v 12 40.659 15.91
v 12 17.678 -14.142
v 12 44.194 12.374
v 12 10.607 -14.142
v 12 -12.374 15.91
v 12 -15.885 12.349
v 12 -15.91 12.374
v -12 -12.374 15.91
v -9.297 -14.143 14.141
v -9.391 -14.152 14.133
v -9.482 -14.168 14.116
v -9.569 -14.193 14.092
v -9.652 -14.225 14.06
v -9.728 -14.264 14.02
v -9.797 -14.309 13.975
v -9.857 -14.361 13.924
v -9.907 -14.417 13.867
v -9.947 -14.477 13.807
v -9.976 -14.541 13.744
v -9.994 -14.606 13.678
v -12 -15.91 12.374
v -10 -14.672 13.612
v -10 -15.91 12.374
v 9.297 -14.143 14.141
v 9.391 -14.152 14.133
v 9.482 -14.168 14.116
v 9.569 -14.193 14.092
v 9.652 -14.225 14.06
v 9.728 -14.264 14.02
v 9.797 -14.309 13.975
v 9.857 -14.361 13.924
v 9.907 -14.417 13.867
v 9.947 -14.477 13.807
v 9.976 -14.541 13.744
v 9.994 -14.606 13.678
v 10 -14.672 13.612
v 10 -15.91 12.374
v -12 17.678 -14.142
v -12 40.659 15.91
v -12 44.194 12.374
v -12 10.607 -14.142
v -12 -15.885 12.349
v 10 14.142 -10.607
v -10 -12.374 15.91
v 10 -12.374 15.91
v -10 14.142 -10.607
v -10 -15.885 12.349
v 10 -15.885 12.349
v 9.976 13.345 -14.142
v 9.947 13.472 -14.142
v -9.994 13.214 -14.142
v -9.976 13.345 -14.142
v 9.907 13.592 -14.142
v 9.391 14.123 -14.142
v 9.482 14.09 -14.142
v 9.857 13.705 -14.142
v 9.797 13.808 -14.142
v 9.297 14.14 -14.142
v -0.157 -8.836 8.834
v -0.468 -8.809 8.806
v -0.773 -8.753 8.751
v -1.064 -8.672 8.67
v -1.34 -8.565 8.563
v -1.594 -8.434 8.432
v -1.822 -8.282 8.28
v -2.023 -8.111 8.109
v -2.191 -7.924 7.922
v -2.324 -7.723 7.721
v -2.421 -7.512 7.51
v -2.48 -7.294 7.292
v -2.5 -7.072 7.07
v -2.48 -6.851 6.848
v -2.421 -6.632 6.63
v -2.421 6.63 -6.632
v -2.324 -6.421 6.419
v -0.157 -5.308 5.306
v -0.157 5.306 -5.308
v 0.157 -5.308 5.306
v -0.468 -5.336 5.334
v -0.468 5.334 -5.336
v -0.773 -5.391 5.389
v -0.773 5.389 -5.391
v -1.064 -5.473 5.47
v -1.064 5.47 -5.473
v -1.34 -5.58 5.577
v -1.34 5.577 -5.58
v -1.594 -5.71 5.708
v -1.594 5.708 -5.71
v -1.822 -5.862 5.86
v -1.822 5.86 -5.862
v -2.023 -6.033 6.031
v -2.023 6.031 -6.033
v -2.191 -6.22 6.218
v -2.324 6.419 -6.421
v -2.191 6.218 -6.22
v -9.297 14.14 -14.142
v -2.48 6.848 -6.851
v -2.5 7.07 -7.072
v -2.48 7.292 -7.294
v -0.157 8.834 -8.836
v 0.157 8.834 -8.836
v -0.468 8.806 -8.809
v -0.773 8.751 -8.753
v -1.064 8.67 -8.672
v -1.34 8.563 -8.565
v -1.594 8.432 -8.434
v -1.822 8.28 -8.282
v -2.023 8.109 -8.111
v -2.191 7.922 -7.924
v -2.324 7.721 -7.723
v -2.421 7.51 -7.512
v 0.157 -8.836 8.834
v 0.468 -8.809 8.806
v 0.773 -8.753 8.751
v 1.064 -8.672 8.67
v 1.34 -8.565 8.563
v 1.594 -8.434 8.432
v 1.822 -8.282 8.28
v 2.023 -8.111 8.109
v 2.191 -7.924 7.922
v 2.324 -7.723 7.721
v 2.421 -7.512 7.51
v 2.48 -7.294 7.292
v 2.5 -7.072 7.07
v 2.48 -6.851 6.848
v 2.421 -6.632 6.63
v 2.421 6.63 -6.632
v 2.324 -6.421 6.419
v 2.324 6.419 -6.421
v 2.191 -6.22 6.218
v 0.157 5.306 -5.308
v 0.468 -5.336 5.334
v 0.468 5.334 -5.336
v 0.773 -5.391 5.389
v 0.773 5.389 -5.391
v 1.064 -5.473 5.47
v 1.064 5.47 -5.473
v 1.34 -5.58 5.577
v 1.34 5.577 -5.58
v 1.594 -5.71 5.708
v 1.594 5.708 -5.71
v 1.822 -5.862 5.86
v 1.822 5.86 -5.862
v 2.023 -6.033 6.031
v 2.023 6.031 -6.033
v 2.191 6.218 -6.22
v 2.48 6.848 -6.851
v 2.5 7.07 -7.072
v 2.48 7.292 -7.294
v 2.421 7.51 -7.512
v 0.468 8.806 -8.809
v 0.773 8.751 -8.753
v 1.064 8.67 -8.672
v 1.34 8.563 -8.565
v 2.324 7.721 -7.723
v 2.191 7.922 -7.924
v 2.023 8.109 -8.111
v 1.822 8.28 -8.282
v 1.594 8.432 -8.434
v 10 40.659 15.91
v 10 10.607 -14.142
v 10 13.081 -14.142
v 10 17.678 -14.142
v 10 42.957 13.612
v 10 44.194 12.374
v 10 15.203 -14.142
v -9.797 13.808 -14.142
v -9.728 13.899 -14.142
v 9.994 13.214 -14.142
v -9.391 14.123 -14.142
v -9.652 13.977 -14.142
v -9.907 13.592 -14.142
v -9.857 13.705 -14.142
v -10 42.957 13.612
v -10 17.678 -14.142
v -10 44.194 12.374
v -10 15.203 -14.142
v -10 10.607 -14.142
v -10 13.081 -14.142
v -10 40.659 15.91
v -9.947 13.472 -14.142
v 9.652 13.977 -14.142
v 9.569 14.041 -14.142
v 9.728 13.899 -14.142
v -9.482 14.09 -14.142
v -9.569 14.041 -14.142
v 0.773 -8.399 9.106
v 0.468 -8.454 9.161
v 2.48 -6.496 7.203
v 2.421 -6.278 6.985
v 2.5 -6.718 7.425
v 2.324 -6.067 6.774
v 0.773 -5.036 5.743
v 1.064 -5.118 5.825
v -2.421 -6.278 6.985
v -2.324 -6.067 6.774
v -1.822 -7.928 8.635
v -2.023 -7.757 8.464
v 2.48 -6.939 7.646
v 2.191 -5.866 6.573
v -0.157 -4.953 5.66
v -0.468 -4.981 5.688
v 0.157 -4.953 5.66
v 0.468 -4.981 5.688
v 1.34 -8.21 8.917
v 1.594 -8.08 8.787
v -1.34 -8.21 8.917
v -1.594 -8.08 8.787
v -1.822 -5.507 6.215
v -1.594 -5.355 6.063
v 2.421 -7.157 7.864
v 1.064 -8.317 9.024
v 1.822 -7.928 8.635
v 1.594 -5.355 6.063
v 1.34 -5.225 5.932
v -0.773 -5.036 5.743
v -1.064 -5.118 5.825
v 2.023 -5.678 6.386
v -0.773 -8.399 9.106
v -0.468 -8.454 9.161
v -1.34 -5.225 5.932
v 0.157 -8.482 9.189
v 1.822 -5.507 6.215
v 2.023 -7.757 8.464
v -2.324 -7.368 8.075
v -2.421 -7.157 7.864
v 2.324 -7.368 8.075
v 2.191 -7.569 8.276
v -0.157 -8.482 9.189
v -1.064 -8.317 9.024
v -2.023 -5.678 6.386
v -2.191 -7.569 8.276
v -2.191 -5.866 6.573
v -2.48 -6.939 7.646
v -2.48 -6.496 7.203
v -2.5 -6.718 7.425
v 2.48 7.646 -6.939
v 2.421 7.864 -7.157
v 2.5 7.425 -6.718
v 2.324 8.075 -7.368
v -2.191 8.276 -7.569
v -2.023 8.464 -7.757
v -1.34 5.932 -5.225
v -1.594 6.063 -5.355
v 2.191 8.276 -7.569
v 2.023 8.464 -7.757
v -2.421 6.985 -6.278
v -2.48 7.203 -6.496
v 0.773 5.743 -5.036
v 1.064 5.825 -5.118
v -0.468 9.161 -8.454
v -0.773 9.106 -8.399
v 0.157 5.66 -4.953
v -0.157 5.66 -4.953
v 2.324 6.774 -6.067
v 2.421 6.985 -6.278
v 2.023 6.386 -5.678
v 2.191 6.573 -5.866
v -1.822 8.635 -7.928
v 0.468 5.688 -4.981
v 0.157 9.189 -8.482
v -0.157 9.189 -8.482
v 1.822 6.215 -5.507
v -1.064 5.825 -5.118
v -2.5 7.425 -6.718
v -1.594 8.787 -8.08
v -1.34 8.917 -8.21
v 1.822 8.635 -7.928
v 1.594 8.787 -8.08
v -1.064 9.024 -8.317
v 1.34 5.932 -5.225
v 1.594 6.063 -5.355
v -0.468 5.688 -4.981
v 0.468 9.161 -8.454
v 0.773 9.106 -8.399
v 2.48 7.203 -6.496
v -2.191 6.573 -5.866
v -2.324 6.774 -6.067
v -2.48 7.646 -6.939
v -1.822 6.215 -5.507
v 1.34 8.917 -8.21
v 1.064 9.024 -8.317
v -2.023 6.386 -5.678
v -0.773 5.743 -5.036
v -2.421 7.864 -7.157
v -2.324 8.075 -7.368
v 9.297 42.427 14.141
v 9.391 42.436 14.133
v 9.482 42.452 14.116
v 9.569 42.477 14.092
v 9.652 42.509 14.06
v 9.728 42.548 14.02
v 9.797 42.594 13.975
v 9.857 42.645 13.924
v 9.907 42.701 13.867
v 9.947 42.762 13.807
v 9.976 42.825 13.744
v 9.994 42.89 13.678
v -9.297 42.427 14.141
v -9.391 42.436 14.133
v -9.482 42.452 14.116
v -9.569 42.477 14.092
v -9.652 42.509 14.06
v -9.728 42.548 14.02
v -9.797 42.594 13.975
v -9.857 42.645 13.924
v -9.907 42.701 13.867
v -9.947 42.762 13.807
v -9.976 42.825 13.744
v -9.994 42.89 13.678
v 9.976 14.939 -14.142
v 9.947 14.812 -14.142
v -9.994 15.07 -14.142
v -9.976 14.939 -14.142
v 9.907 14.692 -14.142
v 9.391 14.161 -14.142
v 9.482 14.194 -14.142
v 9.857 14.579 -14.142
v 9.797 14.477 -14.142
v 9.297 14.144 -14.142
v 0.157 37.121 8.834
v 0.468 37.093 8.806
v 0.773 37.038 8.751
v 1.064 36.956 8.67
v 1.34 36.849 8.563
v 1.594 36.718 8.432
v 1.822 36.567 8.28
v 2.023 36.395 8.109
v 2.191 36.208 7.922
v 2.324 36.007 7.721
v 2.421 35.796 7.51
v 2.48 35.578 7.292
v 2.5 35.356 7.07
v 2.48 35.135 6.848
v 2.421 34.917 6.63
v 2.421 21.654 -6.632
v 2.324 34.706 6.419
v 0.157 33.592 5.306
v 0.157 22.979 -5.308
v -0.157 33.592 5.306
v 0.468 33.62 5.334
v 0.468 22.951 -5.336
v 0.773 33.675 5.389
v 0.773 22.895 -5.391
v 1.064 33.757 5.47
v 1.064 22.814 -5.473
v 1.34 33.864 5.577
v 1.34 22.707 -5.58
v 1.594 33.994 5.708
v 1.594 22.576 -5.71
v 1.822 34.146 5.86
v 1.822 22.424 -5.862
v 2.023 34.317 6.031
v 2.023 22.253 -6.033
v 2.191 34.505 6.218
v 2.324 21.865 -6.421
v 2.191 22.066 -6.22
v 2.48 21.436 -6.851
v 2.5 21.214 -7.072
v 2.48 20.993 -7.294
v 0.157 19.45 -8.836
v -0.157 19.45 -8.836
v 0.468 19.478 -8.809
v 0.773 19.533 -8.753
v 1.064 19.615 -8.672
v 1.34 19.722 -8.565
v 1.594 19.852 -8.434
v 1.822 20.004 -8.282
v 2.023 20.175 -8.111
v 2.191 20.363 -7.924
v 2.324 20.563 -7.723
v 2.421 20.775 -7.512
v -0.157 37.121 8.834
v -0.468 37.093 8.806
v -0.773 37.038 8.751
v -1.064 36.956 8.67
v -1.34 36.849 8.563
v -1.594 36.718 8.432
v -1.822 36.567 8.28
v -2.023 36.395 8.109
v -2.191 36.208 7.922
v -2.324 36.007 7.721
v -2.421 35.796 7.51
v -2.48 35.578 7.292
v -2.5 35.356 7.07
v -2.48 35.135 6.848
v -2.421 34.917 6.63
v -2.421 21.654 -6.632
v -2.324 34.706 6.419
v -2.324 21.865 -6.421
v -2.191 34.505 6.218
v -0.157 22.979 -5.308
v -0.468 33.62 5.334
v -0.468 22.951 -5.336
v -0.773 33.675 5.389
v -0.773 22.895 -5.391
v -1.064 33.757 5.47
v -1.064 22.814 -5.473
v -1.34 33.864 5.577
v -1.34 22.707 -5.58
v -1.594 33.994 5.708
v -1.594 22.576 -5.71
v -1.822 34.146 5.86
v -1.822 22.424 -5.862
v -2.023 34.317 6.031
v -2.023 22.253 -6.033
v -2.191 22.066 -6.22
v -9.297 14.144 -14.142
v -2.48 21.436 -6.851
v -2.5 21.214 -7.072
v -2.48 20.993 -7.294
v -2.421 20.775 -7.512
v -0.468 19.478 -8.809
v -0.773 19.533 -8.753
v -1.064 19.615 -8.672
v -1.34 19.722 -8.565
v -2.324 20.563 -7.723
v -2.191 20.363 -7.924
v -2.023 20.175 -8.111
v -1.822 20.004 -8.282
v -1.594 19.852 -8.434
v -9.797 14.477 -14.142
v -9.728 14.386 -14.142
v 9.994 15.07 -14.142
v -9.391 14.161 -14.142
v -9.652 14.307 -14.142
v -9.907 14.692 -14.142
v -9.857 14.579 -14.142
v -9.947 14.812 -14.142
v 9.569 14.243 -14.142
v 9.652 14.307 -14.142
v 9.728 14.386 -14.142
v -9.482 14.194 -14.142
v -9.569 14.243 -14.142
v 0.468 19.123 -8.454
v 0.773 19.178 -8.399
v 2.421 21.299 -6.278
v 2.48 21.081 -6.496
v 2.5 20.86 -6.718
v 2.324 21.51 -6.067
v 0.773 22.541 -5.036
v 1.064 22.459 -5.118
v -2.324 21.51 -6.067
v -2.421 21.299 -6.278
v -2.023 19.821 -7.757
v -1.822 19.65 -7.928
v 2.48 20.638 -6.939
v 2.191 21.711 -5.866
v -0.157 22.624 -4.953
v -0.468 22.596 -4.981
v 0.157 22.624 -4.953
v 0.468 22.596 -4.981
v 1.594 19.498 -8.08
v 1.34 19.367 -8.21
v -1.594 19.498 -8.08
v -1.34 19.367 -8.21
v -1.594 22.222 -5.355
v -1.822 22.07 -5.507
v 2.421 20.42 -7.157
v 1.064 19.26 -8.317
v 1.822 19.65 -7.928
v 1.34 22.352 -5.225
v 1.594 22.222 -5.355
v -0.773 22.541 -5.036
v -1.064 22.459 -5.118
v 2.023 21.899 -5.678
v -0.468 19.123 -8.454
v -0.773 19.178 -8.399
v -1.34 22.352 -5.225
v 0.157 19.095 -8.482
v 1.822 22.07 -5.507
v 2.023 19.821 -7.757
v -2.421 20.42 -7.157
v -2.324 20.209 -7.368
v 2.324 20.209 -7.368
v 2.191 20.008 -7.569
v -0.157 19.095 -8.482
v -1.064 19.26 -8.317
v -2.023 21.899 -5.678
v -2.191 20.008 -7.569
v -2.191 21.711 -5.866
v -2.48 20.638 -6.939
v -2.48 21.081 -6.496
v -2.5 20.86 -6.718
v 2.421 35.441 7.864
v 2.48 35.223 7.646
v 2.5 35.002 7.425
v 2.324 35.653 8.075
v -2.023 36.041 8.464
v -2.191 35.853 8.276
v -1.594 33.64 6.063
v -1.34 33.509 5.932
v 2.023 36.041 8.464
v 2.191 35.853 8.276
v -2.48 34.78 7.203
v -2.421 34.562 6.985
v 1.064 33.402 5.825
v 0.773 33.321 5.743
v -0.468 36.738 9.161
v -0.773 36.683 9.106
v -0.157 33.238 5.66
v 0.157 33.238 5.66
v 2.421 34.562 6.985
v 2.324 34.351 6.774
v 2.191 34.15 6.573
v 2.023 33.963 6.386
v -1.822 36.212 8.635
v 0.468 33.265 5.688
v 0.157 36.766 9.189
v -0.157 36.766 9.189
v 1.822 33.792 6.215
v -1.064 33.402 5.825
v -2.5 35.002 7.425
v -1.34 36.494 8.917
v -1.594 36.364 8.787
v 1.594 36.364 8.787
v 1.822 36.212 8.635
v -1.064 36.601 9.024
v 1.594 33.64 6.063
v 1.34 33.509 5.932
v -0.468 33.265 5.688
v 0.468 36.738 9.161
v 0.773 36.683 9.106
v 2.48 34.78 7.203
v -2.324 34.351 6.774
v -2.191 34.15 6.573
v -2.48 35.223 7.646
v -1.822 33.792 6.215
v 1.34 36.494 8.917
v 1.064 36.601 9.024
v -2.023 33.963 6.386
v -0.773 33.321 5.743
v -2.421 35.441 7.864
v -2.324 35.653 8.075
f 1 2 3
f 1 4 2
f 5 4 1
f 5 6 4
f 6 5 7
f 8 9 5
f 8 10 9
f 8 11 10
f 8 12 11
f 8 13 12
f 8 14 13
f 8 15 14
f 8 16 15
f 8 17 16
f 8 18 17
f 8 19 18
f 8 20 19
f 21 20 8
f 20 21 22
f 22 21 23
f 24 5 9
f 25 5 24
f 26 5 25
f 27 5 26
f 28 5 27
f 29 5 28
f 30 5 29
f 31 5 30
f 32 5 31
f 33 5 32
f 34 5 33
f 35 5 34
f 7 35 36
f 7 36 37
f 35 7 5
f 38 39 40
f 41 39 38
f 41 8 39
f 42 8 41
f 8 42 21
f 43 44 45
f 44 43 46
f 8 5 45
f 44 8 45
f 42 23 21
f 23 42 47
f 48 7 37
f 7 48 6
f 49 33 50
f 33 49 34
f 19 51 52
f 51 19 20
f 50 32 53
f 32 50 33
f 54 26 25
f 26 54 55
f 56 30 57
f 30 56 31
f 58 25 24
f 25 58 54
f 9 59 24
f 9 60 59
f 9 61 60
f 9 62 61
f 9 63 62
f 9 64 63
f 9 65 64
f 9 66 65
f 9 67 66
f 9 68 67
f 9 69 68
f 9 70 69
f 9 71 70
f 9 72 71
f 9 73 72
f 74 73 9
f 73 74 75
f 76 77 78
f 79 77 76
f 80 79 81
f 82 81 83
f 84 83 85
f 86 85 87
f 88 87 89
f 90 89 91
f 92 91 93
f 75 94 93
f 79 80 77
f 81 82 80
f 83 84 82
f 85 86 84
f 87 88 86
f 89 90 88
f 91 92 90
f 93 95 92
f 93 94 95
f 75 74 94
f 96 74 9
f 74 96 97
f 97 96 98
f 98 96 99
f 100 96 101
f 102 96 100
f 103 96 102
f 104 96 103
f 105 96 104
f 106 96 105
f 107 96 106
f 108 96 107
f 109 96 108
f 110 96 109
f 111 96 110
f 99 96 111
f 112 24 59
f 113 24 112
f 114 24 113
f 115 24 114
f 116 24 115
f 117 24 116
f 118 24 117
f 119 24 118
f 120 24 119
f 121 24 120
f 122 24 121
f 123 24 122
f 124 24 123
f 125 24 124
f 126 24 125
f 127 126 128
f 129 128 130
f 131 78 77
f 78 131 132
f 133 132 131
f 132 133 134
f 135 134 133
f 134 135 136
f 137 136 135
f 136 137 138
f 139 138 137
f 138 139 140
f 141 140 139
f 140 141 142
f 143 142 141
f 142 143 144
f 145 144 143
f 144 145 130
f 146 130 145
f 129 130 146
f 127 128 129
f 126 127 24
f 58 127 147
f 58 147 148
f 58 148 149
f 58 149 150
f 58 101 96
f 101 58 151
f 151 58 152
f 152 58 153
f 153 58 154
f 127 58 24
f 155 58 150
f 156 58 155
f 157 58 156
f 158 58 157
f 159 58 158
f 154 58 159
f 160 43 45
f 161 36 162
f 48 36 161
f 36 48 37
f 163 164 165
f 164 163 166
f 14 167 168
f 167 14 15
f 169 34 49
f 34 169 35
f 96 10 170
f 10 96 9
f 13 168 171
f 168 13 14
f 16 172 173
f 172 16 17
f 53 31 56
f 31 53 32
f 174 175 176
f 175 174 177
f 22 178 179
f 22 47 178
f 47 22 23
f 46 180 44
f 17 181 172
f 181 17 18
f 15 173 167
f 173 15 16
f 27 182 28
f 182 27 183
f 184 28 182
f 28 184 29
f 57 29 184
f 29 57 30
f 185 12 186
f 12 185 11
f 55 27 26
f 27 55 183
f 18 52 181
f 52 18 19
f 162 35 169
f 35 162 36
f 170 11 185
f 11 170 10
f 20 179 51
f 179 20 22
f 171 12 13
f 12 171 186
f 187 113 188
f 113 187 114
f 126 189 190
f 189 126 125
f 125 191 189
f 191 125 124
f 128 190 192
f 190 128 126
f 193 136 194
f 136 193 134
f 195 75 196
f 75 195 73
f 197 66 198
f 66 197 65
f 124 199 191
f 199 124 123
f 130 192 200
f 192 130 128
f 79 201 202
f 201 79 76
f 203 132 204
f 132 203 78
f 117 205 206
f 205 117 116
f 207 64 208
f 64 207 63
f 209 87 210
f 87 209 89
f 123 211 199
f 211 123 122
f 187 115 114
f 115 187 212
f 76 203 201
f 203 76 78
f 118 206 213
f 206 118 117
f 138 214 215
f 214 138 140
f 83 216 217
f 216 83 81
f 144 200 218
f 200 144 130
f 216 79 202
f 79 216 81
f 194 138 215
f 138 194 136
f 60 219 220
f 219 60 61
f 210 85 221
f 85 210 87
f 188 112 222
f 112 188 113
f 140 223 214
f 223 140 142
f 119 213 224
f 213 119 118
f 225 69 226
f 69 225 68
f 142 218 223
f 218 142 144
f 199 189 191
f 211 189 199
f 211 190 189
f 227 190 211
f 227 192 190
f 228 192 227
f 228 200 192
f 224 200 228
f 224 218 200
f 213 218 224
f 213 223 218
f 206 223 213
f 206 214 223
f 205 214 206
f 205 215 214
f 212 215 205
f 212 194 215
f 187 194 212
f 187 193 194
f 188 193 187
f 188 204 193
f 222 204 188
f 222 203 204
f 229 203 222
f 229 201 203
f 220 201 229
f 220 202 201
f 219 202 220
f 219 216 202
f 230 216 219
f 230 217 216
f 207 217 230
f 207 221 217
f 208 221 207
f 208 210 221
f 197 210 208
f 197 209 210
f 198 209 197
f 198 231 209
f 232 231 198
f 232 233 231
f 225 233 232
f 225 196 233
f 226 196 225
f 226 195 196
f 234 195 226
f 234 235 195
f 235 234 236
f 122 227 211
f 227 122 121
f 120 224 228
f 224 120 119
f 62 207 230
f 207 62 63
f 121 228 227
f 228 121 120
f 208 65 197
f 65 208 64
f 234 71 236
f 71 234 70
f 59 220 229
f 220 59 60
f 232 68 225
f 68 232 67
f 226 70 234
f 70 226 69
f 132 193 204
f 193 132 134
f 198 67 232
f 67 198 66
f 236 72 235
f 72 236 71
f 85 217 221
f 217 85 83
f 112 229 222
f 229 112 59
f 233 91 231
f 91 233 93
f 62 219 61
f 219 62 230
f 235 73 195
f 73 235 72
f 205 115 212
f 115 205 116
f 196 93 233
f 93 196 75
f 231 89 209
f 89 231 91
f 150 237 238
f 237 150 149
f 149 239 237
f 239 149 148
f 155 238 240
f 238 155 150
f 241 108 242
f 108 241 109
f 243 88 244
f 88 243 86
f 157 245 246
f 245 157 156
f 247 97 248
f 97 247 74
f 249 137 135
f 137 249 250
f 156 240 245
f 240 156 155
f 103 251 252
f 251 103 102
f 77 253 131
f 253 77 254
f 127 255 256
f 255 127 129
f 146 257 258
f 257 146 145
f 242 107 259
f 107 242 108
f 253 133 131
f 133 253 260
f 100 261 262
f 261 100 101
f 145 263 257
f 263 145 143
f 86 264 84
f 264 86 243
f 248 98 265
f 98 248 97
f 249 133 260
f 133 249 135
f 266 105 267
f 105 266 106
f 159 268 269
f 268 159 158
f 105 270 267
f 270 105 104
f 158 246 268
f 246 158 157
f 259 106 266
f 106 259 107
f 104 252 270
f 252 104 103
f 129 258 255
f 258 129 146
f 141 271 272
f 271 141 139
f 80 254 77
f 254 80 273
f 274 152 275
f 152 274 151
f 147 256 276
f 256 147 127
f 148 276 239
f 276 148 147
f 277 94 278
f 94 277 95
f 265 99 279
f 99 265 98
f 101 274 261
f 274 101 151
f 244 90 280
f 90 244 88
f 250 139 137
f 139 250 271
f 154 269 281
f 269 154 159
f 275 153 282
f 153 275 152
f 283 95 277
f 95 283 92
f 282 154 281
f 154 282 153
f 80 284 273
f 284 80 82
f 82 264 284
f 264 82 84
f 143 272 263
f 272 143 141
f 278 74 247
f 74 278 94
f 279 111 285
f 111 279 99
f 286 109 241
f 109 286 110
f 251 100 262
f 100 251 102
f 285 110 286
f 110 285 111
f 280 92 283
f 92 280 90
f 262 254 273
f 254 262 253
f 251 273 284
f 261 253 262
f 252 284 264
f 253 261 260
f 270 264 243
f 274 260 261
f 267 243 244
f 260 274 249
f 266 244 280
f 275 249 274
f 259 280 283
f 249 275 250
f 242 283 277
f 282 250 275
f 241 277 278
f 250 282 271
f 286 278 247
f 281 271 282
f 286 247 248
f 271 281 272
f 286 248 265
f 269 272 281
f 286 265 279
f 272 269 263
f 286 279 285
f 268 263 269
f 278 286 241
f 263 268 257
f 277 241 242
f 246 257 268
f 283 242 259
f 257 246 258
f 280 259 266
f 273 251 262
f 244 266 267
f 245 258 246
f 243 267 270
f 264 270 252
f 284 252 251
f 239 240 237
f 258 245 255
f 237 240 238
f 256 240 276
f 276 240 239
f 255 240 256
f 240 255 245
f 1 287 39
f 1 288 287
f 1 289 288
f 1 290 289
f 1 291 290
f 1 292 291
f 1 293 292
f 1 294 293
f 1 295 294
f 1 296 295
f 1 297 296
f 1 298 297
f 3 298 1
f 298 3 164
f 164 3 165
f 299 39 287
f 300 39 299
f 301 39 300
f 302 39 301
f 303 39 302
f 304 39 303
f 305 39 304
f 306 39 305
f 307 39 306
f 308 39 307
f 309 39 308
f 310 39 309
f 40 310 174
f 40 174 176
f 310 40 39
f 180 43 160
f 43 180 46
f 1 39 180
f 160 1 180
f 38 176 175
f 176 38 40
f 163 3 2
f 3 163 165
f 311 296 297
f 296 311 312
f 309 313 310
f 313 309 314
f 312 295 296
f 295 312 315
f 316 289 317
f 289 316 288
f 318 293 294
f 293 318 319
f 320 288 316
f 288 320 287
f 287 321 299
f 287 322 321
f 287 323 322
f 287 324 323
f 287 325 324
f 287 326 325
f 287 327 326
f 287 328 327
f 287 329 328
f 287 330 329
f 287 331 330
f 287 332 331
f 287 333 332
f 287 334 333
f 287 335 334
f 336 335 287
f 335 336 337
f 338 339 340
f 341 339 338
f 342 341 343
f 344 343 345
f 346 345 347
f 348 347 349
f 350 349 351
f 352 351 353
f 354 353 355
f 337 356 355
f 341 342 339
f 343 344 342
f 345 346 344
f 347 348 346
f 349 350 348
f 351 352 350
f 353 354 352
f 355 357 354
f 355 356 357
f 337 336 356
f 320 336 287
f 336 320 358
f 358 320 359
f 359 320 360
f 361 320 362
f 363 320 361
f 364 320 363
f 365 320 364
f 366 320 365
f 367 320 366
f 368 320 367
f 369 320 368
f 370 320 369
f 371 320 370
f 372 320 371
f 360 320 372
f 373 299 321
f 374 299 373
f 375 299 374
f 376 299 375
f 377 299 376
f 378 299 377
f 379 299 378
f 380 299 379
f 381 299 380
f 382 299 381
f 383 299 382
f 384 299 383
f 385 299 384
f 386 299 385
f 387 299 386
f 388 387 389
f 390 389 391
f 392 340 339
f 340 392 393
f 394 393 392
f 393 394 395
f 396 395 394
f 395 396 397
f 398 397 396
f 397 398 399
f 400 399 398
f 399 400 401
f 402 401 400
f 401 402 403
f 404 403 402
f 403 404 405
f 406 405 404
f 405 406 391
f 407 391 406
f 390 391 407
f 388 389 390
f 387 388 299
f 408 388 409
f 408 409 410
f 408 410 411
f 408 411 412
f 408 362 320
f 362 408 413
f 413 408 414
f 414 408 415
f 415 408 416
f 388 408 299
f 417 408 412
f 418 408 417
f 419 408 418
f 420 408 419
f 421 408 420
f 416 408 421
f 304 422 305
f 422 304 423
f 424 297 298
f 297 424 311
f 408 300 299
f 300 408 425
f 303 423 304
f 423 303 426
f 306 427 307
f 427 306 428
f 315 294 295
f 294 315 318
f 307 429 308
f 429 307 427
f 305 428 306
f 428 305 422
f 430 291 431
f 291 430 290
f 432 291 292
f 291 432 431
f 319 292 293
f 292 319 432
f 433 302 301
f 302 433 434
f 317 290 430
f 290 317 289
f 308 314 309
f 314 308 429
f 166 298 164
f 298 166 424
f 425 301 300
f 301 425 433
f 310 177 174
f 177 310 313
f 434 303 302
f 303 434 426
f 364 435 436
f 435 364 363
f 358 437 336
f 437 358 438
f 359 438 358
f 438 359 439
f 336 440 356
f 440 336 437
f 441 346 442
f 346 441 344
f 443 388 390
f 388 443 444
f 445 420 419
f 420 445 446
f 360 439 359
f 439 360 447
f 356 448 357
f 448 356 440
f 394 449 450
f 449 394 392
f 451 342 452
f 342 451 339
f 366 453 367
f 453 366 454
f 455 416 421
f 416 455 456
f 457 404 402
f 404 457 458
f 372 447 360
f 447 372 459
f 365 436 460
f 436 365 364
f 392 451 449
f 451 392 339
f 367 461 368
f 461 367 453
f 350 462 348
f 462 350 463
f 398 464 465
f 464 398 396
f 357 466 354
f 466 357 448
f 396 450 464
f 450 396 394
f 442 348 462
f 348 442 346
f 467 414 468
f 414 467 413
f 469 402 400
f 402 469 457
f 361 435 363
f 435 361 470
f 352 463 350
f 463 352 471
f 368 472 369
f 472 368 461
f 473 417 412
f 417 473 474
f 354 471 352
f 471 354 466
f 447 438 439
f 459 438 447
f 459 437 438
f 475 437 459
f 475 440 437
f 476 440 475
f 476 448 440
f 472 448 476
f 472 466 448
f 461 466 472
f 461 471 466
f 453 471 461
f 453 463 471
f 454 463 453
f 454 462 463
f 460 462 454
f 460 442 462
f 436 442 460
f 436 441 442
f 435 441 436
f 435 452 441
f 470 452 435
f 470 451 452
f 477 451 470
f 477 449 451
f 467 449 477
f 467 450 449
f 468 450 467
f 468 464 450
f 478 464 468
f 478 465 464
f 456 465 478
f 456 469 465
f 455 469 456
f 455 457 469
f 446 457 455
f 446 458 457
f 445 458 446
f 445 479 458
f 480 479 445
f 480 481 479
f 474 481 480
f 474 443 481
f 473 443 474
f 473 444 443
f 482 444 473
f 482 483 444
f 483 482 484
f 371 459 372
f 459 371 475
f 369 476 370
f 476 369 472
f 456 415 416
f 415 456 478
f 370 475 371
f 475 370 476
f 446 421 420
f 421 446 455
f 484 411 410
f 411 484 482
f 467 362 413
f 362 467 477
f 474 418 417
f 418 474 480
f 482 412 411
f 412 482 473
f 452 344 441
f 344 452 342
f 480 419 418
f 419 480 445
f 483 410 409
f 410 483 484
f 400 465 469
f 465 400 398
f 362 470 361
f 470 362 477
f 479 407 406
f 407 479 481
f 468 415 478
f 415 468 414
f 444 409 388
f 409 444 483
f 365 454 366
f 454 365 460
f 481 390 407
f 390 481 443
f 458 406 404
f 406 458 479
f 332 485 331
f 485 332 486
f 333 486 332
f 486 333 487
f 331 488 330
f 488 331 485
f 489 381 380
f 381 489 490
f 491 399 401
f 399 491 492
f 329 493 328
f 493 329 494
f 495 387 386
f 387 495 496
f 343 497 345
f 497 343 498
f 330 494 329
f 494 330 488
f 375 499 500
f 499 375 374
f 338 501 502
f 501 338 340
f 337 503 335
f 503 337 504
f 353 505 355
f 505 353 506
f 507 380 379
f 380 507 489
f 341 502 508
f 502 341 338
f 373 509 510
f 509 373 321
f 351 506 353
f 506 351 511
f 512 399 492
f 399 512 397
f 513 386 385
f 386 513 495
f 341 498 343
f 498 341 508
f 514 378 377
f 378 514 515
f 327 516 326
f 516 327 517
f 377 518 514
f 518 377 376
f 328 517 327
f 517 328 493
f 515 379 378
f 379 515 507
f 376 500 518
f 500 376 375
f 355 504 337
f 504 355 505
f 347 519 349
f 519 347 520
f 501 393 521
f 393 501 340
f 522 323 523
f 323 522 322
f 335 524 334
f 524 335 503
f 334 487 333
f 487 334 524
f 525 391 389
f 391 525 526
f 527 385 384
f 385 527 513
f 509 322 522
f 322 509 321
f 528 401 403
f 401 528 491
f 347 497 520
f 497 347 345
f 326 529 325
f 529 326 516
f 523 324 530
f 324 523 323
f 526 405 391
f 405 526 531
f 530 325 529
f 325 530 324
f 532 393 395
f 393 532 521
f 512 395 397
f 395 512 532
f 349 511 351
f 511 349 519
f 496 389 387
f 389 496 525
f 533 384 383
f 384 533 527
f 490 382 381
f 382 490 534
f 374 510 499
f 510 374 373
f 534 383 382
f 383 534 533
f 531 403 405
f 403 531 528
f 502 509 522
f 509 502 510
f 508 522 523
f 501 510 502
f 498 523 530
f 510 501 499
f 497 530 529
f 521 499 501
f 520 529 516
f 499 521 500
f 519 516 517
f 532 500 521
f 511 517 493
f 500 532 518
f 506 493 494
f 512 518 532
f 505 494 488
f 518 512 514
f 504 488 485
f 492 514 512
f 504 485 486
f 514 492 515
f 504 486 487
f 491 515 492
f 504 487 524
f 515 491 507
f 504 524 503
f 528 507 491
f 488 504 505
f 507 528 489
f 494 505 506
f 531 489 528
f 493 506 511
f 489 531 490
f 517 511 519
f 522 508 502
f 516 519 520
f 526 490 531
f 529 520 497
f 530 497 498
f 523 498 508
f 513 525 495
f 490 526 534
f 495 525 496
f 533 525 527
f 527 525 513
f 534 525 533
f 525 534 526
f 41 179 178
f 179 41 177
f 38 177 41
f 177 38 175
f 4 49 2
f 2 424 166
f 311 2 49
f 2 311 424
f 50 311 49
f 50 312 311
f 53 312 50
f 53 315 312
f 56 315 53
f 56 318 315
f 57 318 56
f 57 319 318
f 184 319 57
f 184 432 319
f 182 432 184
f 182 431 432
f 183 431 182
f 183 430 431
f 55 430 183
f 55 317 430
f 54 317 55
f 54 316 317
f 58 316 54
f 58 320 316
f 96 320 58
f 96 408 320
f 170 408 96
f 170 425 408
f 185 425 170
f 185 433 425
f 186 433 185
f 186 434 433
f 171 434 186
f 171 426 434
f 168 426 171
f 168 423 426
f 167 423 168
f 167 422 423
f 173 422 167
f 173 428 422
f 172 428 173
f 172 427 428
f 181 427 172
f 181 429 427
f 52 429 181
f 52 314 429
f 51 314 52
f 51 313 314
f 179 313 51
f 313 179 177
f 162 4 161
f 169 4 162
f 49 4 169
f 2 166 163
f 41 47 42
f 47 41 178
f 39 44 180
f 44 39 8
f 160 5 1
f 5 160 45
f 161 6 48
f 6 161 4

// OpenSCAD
// file: TSlotExtrusion.scad
//measurments in mm
//from zyltech.com's image (2020TslotProfileFromZyltech.jpg)
extrusionWidth = 20;

slotMouthWidth = 6.2;
slotMouthChamferWidth = 7.2; //sorry about the name, best i could come up with per the image

slotWidthWidest = 11;

slotDepth = 6.12; //measument I had to take myself... wtf zyltech
dumbSlotDepth = 4.3; //not to outer surface

holeDia = 5;
//measuments in mm end

//missing from drawing
cornerRadius = 1.5;

 $fn=50;

module aCorner(i)
{
    translate([(extrusionWidth/2)-(slotDepth/2),0,0])
        {
            hull()
                {
                    square([slotDepth-dumbSlotDepth,slotWidthWidest],true);
                    translate([-slotDepth/4,0,0])square([slotDepth/2, slotMouthWidth],true);
                }
            square([slotDepth, slotMouthWidth],true);
        }
}

module theCorners()
{
    for(i = [0,90,180,270])
    {
        rotate([0,0,i])
            {
                aCorner(i);
            }
    }
}


module tSlotProfile(length)
{
    difference()
    {
        minkowski()
        {
          square([extrusionWidth-(cornerRadius), extrusionWidth-(cornerRadius)],true);
          circle(d=cornerRadius);
        }
        
        circle(d = holeDia);
        theCorners();
    }
}


module tSlotExtrusion(length)
{
    linear_extrude(height = length, convexity = 20)
    {
    tSlotProfile();
    }
}

//tSlotExtrusion(100);

//T Slot Extrusion
//Eric Moderbacher
//6/10/24
// main file
include<TSlotExtrusion.scad>

gussetContactLength = 40;

module 0th() 
{
 //echo( "hello world!"); //well for this program anyways
}

module 1th(littleExtra = 0)
{
cube([extrusionWidth + 4,5+littleExtra,gussetContactLength+littleExtra],true);
0th(); //aw i dont have to include this for things to work thats cute
}

module 2th()
{
        hull()
        {
            intersection()
            {
                1th(littleExtra = 1);
                translate([0,-10,-gussetContactLength])tSlotExtrusion(100);
            }
        }
}

module 3th()
{
    difference()
    {        
        1th();
        2th();
    }
}

module 4th() 
{
    difference()
    {
        rotate([90,0,0])3th();
        translate([0,-10, -.50])cylinder(h=6,d = 5,true);
        translate([0, 10, -.50])cylinder(h=6,d = 5,true);
    }
}

module 5th()
{
    intersection()
    {
        rotate([-45,0,0])
        {
            union()
            {
                4th();
                translate([0,gussetContactLength/2,gussetContactLength/2])rotate([90,0,0])4th();
            }
        }
        translate([-50,-50,-sqrt(pow(10,2)+pow(10,2))])cube([100,100,40],false); //
    }
}

module 6th(shift = 1)
{
    difference()
    {
        5th();
        cube([extrusionWidth,1000,1000],true);
        translate([(extrusionWidth/2)*shift,0,0])cube([extrusionWidth, 1000,1000],true);
    }


}
module 7th(shift = 1)
{
    union()
    {
        5th();
        hull()6th();
        hull()6th(-1);
    }
    

}

module nth(){
//you update this when you add the a newer function on top of it. (or have the compiler set it using the highest numbered function here.
7th();

}

module gusset()
{ 
    nth();  //LOL this is a way to do fusions timeline!
}

gusset();

//Eric Moderbacher
//6/12/24ish
